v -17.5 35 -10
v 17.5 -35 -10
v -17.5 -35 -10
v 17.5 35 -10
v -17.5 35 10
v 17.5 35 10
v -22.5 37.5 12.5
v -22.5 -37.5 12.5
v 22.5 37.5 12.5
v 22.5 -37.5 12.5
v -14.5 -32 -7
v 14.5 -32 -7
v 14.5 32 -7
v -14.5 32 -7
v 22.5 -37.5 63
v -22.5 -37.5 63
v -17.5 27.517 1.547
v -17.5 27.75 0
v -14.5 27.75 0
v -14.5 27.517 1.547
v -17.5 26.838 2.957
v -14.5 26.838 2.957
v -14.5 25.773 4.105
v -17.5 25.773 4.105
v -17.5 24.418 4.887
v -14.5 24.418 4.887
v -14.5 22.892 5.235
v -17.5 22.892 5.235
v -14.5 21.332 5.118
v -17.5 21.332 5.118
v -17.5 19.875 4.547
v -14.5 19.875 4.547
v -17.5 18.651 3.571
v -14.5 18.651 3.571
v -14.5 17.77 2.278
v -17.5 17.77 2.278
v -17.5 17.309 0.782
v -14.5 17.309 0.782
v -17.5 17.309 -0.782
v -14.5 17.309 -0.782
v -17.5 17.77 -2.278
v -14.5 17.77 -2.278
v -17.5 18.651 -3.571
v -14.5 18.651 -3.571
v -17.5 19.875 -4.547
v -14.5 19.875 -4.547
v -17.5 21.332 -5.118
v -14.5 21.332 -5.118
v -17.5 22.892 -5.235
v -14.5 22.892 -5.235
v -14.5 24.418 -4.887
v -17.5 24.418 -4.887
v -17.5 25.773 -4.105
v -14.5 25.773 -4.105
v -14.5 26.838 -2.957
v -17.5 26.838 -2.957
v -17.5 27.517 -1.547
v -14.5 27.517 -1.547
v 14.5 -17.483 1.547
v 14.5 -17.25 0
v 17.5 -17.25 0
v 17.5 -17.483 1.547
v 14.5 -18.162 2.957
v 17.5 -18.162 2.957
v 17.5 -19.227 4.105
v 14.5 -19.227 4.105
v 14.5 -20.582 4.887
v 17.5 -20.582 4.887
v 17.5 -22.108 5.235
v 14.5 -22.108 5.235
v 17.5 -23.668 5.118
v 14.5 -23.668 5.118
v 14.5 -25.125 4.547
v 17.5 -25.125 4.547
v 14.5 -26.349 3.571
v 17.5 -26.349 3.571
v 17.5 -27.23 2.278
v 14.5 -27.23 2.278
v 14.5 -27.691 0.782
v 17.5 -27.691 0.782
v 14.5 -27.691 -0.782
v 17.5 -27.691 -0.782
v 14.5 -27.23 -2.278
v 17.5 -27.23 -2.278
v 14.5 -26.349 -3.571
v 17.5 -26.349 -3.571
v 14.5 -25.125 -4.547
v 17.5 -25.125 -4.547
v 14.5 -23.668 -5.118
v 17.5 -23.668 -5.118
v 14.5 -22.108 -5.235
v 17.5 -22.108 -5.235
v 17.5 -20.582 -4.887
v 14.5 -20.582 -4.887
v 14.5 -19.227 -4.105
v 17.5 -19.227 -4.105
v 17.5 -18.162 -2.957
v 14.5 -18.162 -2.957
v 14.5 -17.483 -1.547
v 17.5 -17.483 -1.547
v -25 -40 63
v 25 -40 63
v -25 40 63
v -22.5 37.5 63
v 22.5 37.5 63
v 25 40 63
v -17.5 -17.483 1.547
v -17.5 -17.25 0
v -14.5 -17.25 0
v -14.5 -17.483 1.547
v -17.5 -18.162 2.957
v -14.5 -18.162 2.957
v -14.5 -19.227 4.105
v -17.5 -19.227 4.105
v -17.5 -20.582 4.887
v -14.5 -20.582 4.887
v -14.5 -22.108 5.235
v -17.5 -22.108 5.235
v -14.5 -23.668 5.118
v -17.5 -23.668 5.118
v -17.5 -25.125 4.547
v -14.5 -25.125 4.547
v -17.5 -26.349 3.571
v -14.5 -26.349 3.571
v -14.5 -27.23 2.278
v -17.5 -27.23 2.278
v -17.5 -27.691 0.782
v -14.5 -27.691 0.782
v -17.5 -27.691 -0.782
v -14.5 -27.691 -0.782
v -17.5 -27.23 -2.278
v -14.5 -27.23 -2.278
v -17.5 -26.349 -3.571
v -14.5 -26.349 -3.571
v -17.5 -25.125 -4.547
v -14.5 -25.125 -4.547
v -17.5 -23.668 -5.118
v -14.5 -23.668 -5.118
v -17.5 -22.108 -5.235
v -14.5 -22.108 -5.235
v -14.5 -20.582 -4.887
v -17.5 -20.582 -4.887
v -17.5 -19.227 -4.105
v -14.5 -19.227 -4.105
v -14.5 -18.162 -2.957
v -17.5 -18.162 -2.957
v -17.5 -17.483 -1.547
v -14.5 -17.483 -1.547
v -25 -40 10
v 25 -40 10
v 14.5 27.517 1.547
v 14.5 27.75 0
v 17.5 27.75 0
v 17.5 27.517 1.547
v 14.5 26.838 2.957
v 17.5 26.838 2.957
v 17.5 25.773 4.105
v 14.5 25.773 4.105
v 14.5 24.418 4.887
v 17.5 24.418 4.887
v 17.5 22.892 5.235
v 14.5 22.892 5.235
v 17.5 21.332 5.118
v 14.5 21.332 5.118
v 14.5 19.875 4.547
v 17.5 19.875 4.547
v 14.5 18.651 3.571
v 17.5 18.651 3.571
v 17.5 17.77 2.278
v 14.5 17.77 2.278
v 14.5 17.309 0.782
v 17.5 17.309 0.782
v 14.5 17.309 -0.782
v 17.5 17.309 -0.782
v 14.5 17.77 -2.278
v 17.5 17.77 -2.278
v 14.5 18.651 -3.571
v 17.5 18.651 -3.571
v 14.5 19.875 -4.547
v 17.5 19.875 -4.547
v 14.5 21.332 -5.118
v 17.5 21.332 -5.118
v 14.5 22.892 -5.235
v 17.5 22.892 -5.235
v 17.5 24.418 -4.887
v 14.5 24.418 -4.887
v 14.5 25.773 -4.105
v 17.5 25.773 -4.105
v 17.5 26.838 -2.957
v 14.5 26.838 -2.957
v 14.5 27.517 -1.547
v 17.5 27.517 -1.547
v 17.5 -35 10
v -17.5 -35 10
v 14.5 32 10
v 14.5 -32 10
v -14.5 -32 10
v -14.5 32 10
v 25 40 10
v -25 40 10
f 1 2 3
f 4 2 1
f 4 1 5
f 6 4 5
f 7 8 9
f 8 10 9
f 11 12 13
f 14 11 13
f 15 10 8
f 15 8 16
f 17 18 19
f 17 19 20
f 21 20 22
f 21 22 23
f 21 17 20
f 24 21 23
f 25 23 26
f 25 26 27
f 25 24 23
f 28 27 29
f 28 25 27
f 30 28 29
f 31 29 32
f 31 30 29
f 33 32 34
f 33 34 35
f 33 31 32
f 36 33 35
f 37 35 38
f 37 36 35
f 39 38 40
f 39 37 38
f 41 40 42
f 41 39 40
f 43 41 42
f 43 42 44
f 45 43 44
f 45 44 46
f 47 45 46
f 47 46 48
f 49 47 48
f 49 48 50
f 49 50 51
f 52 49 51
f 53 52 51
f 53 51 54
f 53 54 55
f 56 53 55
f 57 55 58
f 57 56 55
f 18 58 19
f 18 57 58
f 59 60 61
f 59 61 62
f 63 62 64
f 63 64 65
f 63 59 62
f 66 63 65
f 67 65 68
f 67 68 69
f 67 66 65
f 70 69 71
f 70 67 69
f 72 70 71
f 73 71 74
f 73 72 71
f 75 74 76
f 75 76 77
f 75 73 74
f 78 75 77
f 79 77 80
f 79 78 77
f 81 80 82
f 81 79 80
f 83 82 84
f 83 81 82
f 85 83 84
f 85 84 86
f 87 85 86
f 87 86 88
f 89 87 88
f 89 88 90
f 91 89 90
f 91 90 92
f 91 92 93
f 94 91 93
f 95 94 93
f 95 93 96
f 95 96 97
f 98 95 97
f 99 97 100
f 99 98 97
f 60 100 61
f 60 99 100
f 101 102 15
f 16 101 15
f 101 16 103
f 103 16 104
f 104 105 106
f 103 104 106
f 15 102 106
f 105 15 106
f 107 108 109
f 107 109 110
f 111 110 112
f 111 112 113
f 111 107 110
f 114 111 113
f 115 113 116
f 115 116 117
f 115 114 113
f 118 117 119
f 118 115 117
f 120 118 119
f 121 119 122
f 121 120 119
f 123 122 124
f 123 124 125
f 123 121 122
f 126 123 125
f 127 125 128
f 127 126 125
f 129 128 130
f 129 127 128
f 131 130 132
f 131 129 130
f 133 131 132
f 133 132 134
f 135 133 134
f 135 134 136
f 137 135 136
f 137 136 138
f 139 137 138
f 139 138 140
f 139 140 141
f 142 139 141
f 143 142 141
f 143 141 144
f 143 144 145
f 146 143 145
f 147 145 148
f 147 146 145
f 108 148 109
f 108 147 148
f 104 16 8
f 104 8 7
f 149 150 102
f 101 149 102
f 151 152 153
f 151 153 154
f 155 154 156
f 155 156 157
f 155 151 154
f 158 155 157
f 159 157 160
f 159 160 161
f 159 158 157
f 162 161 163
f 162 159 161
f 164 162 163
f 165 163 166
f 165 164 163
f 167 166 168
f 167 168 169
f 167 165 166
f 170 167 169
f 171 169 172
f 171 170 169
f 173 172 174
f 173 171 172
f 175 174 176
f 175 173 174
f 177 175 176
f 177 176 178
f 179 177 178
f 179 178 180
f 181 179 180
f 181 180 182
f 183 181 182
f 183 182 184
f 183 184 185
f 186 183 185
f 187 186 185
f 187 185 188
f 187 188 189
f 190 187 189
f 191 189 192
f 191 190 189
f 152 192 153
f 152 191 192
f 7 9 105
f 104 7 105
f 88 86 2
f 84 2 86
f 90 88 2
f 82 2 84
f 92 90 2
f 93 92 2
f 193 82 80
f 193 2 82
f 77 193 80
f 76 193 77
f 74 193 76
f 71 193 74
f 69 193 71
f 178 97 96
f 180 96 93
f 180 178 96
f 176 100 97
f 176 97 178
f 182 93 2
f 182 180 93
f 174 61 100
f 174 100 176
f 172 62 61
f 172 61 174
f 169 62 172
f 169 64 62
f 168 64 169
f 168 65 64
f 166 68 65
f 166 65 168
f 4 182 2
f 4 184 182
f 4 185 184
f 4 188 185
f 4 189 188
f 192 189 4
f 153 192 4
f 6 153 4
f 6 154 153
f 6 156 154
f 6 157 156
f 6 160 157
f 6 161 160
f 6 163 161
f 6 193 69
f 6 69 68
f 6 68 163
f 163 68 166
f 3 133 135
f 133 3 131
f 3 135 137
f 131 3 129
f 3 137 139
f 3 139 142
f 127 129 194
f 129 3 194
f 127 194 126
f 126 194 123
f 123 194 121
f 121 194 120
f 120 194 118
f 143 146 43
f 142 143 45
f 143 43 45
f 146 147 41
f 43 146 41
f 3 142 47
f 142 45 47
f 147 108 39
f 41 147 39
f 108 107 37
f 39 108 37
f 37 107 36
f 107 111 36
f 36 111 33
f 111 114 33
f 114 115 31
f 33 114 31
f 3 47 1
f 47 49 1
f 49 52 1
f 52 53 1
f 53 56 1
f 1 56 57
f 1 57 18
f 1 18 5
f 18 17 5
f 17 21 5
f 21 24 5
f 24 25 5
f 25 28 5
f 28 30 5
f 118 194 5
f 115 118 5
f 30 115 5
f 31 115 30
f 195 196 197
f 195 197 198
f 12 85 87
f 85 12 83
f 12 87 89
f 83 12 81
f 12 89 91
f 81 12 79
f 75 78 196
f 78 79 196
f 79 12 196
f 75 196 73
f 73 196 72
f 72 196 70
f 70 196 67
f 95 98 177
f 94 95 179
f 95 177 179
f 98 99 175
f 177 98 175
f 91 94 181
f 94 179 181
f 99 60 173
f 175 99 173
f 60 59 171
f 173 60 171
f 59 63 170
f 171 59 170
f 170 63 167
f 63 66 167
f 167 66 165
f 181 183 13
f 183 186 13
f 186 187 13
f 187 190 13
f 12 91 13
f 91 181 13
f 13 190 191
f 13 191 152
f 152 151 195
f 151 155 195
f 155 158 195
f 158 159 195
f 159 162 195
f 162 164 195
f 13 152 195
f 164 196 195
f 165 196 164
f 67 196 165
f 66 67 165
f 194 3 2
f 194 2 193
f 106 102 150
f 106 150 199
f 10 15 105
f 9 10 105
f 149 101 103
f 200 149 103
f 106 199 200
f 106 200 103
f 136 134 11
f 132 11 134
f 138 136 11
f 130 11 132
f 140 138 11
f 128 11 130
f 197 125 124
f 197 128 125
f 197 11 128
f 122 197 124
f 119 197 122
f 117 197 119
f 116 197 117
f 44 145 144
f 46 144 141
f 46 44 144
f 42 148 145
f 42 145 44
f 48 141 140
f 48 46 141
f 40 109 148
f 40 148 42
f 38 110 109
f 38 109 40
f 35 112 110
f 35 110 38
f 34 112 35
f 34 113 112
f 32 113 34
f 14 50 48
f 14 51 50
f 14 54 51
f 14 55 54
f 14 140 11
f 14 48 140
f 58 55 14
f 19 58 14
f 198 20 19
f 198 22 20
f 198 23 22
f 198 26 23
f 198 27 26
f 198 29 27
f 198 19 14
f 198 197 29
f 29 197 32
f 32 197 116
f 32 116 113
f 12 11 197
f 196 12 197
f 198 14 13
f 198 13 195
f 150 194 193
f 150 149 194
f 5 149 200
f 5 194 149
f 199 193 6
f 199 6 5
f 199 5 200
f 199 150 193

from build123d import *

# Parameters (mm, degrees)
F0_W         = 70
F0_H         = 20
F0_R         = 5.25
F1_DEPTH     = 17.5
F2_T         = -3
F3_W         = 80
F3_H         = 53
F4_DEPTH     = 25
F5_T         = 2.5
F5_T3_DEPTH  = 40
F5_T5_DEPTH  = 75
F5_T7_DEPTH  = 69
F5_T9_DEPTH  = 22
F5_T11_DEPTH = 34


# Not quite as in the source:
# - a shell that OpenCascade refuses in one call is made with other operations: the cavity is built on its own and cut out


with BuildPart() as f1:
    # F0 (on Right) → F1 (new body, symmetric)
    with BuildSketch(Plane.YZ):
        Rectangle(F0_W, F0_H)
        with Locations((-22.5, 0)):
            Circle(F0_R, mode=Mode.SUBTRACT)
        with Locations((22.5, 0)):
            Circle(F0_R, mode=Mode.SUBTRACT)
    extrude(amount=F1_DEPTH, both=True)

    # F2
    f2_openings = [f1.faces().sort_by_distance(p)[0] for p in [
        (0, 0, 10),
        (0, -27.75, 0),
        (0, 17.25, 0),
    ]]
    offset(amount=F2_T, openings=f2_openings)

    # F3 (on Right) → F4 (join, symmetric)
    with BuildSketch(Plane.YZ):
        with Locations((0, 36.5)):
            Rectangle(F3_W, F3_H)
    extrude(amount=F4_DEPTH, both=True)

    # F5: shell of thickness 2.5, made by hand


with BuildPart() as f5_core1:
    # F5_t2: copy of F1
    add(f1.part)

    # the walls: a layer under each face that stays
    f5_faces = [f5_core1.faces().sort_by_distance(p)[0] for p in [
        (-21.4285714286, -34.2857142857, 10),
        (-25, 0, 36.5),
        (0, -40, 36.5),
        (0, 40, 36.5),
        (25, 0, 36.5),
        (0, 35, 0),
        (17.5, 0, 0),
        (0, -35, 0),
        (-17.5, 0, 0),
        (0, 0, -10),
        (16, -27.75, 0),
        (16, 17.25, 0),
        (-16, -27.75, 0),
        (-16, 17.25, 0),
        (14.5, 0, 1.5),
        (-14.5, 0, 1.5),
        (0, 0, 10),
        (0, -32, 1.5),
        (0, 0, -7),
        (0, 32, 1.5),
    ]]
    thicken(f5_faces, amount=-F5_T, mode=Mode.SUBTRACT)

    # F5_s4 → F5_t3 (cut)
    with BuildSketch(Plane.YZ.offset(-20)):
        Polygon((35.025, 9.975), (35, 12.5), (32.5, 12.5), (32.5, 10), align=None)
        Polygon((-35.025, 9.975), (-35, 12.5), (-32.5, 12.5), (-32.5, 10), align=None)
    extrude(amount=F5_T3_DEPTH, mode=Mode.SUBTRACT)

    # F5_s6 → F5_t5 (cut)
    with BuildSketch(Plane.XZ.offset(-37.5)):
        Polygon((17.525, 9.975), (17.5, 12.5), (15, 12.5), (15, 10), align=None)
        Polygon((-17.525, 9.975), (-17.5, 12.5), (-15, 12.5), (-15, 10), align=None)
    extrude(amount=F5_T5_DEPTH, mode=Mode.SUBTRACT)

    # F5_s8 → F5_t7 (cut)
    with BuildSketch(Plane.XZ.offset(-34.5)):
        Polygon((14.475, 9.975), (17, 10), (17, 12.5), (14.5, 12.5), align=None)
        Polygon((14.475, -6.975), (17, -7), (17, -9.5), (14.5, -9.5), align=None)
        Polygon((-14.475, 9.975), (-17, 10), (-17, 12.5), (-14.5, 12.5), align=None)
        Polygon((-14.475, -6.975), (-17, -7), (-17, -9.5), (-14.5, -9.5), align=None)
    extrude(amount=F5_T7_DEPTH, mode=Mode.SUBTRACT)

    # F5_s10 → F5_t9 (cut)
    with BuildSketch(Plane.XY.offset(-9.5)):
        Polygon((14.475, -31.975), (17, -32), (17, -34.5), (14.5, -34.5), align=None)
        Polygon((14.475, 31.975), (17, 32), (17, 34.5), (14.5, 34.5), align=None)
        Polygon((-14.475, -31.975), (-17, -32), (-17, -34.5), (-14.5, -34.5), align=None)
        Polygon((-14.475, 31.975), (-17, 32), (-17, 34.5), (-14.5, 34.5), align=None)
    extrude(amount=F5_T9_DEPTH, mode=Mode.SUBTRACT)

    # F5_s12 → F5_t11 (cut)
    with BuildSketch(Plane.YZ.offset(-17)):
        Polygon((-31.975, 9.975), (-32, 12.5), (-34.5, 12.5), (-34.5, 10), align=None)
        Polygon((31.975, 9.975), (32, 12.5), (34.5, 12.5), (34.5, 10), align=None)
        Polygon((-31.975, -6.975), (-34.5, -7), (-34.5, -9.5), (-32, -9.5), align=None)
        Polygon((31.975, -6.975), (32, -9.5), (34.5, -9.5), (34.5, -7), align=None)
    extrude(amount=F5_T11_DEPTH, mode=Mode.SUBTRACT)


with BuildPart() as f1_1:
    add(f1.part)

    # what is left inside the walls is the cavity
    f5_cavity = [f5_core1.part.solids().sort_by_distance(p)[0] for p in [
        (22.475, 0, 29.333333),
    ]]
    add(f5_cavity, mode=Mode.SUBTRACT)


solid = f1_1.part
